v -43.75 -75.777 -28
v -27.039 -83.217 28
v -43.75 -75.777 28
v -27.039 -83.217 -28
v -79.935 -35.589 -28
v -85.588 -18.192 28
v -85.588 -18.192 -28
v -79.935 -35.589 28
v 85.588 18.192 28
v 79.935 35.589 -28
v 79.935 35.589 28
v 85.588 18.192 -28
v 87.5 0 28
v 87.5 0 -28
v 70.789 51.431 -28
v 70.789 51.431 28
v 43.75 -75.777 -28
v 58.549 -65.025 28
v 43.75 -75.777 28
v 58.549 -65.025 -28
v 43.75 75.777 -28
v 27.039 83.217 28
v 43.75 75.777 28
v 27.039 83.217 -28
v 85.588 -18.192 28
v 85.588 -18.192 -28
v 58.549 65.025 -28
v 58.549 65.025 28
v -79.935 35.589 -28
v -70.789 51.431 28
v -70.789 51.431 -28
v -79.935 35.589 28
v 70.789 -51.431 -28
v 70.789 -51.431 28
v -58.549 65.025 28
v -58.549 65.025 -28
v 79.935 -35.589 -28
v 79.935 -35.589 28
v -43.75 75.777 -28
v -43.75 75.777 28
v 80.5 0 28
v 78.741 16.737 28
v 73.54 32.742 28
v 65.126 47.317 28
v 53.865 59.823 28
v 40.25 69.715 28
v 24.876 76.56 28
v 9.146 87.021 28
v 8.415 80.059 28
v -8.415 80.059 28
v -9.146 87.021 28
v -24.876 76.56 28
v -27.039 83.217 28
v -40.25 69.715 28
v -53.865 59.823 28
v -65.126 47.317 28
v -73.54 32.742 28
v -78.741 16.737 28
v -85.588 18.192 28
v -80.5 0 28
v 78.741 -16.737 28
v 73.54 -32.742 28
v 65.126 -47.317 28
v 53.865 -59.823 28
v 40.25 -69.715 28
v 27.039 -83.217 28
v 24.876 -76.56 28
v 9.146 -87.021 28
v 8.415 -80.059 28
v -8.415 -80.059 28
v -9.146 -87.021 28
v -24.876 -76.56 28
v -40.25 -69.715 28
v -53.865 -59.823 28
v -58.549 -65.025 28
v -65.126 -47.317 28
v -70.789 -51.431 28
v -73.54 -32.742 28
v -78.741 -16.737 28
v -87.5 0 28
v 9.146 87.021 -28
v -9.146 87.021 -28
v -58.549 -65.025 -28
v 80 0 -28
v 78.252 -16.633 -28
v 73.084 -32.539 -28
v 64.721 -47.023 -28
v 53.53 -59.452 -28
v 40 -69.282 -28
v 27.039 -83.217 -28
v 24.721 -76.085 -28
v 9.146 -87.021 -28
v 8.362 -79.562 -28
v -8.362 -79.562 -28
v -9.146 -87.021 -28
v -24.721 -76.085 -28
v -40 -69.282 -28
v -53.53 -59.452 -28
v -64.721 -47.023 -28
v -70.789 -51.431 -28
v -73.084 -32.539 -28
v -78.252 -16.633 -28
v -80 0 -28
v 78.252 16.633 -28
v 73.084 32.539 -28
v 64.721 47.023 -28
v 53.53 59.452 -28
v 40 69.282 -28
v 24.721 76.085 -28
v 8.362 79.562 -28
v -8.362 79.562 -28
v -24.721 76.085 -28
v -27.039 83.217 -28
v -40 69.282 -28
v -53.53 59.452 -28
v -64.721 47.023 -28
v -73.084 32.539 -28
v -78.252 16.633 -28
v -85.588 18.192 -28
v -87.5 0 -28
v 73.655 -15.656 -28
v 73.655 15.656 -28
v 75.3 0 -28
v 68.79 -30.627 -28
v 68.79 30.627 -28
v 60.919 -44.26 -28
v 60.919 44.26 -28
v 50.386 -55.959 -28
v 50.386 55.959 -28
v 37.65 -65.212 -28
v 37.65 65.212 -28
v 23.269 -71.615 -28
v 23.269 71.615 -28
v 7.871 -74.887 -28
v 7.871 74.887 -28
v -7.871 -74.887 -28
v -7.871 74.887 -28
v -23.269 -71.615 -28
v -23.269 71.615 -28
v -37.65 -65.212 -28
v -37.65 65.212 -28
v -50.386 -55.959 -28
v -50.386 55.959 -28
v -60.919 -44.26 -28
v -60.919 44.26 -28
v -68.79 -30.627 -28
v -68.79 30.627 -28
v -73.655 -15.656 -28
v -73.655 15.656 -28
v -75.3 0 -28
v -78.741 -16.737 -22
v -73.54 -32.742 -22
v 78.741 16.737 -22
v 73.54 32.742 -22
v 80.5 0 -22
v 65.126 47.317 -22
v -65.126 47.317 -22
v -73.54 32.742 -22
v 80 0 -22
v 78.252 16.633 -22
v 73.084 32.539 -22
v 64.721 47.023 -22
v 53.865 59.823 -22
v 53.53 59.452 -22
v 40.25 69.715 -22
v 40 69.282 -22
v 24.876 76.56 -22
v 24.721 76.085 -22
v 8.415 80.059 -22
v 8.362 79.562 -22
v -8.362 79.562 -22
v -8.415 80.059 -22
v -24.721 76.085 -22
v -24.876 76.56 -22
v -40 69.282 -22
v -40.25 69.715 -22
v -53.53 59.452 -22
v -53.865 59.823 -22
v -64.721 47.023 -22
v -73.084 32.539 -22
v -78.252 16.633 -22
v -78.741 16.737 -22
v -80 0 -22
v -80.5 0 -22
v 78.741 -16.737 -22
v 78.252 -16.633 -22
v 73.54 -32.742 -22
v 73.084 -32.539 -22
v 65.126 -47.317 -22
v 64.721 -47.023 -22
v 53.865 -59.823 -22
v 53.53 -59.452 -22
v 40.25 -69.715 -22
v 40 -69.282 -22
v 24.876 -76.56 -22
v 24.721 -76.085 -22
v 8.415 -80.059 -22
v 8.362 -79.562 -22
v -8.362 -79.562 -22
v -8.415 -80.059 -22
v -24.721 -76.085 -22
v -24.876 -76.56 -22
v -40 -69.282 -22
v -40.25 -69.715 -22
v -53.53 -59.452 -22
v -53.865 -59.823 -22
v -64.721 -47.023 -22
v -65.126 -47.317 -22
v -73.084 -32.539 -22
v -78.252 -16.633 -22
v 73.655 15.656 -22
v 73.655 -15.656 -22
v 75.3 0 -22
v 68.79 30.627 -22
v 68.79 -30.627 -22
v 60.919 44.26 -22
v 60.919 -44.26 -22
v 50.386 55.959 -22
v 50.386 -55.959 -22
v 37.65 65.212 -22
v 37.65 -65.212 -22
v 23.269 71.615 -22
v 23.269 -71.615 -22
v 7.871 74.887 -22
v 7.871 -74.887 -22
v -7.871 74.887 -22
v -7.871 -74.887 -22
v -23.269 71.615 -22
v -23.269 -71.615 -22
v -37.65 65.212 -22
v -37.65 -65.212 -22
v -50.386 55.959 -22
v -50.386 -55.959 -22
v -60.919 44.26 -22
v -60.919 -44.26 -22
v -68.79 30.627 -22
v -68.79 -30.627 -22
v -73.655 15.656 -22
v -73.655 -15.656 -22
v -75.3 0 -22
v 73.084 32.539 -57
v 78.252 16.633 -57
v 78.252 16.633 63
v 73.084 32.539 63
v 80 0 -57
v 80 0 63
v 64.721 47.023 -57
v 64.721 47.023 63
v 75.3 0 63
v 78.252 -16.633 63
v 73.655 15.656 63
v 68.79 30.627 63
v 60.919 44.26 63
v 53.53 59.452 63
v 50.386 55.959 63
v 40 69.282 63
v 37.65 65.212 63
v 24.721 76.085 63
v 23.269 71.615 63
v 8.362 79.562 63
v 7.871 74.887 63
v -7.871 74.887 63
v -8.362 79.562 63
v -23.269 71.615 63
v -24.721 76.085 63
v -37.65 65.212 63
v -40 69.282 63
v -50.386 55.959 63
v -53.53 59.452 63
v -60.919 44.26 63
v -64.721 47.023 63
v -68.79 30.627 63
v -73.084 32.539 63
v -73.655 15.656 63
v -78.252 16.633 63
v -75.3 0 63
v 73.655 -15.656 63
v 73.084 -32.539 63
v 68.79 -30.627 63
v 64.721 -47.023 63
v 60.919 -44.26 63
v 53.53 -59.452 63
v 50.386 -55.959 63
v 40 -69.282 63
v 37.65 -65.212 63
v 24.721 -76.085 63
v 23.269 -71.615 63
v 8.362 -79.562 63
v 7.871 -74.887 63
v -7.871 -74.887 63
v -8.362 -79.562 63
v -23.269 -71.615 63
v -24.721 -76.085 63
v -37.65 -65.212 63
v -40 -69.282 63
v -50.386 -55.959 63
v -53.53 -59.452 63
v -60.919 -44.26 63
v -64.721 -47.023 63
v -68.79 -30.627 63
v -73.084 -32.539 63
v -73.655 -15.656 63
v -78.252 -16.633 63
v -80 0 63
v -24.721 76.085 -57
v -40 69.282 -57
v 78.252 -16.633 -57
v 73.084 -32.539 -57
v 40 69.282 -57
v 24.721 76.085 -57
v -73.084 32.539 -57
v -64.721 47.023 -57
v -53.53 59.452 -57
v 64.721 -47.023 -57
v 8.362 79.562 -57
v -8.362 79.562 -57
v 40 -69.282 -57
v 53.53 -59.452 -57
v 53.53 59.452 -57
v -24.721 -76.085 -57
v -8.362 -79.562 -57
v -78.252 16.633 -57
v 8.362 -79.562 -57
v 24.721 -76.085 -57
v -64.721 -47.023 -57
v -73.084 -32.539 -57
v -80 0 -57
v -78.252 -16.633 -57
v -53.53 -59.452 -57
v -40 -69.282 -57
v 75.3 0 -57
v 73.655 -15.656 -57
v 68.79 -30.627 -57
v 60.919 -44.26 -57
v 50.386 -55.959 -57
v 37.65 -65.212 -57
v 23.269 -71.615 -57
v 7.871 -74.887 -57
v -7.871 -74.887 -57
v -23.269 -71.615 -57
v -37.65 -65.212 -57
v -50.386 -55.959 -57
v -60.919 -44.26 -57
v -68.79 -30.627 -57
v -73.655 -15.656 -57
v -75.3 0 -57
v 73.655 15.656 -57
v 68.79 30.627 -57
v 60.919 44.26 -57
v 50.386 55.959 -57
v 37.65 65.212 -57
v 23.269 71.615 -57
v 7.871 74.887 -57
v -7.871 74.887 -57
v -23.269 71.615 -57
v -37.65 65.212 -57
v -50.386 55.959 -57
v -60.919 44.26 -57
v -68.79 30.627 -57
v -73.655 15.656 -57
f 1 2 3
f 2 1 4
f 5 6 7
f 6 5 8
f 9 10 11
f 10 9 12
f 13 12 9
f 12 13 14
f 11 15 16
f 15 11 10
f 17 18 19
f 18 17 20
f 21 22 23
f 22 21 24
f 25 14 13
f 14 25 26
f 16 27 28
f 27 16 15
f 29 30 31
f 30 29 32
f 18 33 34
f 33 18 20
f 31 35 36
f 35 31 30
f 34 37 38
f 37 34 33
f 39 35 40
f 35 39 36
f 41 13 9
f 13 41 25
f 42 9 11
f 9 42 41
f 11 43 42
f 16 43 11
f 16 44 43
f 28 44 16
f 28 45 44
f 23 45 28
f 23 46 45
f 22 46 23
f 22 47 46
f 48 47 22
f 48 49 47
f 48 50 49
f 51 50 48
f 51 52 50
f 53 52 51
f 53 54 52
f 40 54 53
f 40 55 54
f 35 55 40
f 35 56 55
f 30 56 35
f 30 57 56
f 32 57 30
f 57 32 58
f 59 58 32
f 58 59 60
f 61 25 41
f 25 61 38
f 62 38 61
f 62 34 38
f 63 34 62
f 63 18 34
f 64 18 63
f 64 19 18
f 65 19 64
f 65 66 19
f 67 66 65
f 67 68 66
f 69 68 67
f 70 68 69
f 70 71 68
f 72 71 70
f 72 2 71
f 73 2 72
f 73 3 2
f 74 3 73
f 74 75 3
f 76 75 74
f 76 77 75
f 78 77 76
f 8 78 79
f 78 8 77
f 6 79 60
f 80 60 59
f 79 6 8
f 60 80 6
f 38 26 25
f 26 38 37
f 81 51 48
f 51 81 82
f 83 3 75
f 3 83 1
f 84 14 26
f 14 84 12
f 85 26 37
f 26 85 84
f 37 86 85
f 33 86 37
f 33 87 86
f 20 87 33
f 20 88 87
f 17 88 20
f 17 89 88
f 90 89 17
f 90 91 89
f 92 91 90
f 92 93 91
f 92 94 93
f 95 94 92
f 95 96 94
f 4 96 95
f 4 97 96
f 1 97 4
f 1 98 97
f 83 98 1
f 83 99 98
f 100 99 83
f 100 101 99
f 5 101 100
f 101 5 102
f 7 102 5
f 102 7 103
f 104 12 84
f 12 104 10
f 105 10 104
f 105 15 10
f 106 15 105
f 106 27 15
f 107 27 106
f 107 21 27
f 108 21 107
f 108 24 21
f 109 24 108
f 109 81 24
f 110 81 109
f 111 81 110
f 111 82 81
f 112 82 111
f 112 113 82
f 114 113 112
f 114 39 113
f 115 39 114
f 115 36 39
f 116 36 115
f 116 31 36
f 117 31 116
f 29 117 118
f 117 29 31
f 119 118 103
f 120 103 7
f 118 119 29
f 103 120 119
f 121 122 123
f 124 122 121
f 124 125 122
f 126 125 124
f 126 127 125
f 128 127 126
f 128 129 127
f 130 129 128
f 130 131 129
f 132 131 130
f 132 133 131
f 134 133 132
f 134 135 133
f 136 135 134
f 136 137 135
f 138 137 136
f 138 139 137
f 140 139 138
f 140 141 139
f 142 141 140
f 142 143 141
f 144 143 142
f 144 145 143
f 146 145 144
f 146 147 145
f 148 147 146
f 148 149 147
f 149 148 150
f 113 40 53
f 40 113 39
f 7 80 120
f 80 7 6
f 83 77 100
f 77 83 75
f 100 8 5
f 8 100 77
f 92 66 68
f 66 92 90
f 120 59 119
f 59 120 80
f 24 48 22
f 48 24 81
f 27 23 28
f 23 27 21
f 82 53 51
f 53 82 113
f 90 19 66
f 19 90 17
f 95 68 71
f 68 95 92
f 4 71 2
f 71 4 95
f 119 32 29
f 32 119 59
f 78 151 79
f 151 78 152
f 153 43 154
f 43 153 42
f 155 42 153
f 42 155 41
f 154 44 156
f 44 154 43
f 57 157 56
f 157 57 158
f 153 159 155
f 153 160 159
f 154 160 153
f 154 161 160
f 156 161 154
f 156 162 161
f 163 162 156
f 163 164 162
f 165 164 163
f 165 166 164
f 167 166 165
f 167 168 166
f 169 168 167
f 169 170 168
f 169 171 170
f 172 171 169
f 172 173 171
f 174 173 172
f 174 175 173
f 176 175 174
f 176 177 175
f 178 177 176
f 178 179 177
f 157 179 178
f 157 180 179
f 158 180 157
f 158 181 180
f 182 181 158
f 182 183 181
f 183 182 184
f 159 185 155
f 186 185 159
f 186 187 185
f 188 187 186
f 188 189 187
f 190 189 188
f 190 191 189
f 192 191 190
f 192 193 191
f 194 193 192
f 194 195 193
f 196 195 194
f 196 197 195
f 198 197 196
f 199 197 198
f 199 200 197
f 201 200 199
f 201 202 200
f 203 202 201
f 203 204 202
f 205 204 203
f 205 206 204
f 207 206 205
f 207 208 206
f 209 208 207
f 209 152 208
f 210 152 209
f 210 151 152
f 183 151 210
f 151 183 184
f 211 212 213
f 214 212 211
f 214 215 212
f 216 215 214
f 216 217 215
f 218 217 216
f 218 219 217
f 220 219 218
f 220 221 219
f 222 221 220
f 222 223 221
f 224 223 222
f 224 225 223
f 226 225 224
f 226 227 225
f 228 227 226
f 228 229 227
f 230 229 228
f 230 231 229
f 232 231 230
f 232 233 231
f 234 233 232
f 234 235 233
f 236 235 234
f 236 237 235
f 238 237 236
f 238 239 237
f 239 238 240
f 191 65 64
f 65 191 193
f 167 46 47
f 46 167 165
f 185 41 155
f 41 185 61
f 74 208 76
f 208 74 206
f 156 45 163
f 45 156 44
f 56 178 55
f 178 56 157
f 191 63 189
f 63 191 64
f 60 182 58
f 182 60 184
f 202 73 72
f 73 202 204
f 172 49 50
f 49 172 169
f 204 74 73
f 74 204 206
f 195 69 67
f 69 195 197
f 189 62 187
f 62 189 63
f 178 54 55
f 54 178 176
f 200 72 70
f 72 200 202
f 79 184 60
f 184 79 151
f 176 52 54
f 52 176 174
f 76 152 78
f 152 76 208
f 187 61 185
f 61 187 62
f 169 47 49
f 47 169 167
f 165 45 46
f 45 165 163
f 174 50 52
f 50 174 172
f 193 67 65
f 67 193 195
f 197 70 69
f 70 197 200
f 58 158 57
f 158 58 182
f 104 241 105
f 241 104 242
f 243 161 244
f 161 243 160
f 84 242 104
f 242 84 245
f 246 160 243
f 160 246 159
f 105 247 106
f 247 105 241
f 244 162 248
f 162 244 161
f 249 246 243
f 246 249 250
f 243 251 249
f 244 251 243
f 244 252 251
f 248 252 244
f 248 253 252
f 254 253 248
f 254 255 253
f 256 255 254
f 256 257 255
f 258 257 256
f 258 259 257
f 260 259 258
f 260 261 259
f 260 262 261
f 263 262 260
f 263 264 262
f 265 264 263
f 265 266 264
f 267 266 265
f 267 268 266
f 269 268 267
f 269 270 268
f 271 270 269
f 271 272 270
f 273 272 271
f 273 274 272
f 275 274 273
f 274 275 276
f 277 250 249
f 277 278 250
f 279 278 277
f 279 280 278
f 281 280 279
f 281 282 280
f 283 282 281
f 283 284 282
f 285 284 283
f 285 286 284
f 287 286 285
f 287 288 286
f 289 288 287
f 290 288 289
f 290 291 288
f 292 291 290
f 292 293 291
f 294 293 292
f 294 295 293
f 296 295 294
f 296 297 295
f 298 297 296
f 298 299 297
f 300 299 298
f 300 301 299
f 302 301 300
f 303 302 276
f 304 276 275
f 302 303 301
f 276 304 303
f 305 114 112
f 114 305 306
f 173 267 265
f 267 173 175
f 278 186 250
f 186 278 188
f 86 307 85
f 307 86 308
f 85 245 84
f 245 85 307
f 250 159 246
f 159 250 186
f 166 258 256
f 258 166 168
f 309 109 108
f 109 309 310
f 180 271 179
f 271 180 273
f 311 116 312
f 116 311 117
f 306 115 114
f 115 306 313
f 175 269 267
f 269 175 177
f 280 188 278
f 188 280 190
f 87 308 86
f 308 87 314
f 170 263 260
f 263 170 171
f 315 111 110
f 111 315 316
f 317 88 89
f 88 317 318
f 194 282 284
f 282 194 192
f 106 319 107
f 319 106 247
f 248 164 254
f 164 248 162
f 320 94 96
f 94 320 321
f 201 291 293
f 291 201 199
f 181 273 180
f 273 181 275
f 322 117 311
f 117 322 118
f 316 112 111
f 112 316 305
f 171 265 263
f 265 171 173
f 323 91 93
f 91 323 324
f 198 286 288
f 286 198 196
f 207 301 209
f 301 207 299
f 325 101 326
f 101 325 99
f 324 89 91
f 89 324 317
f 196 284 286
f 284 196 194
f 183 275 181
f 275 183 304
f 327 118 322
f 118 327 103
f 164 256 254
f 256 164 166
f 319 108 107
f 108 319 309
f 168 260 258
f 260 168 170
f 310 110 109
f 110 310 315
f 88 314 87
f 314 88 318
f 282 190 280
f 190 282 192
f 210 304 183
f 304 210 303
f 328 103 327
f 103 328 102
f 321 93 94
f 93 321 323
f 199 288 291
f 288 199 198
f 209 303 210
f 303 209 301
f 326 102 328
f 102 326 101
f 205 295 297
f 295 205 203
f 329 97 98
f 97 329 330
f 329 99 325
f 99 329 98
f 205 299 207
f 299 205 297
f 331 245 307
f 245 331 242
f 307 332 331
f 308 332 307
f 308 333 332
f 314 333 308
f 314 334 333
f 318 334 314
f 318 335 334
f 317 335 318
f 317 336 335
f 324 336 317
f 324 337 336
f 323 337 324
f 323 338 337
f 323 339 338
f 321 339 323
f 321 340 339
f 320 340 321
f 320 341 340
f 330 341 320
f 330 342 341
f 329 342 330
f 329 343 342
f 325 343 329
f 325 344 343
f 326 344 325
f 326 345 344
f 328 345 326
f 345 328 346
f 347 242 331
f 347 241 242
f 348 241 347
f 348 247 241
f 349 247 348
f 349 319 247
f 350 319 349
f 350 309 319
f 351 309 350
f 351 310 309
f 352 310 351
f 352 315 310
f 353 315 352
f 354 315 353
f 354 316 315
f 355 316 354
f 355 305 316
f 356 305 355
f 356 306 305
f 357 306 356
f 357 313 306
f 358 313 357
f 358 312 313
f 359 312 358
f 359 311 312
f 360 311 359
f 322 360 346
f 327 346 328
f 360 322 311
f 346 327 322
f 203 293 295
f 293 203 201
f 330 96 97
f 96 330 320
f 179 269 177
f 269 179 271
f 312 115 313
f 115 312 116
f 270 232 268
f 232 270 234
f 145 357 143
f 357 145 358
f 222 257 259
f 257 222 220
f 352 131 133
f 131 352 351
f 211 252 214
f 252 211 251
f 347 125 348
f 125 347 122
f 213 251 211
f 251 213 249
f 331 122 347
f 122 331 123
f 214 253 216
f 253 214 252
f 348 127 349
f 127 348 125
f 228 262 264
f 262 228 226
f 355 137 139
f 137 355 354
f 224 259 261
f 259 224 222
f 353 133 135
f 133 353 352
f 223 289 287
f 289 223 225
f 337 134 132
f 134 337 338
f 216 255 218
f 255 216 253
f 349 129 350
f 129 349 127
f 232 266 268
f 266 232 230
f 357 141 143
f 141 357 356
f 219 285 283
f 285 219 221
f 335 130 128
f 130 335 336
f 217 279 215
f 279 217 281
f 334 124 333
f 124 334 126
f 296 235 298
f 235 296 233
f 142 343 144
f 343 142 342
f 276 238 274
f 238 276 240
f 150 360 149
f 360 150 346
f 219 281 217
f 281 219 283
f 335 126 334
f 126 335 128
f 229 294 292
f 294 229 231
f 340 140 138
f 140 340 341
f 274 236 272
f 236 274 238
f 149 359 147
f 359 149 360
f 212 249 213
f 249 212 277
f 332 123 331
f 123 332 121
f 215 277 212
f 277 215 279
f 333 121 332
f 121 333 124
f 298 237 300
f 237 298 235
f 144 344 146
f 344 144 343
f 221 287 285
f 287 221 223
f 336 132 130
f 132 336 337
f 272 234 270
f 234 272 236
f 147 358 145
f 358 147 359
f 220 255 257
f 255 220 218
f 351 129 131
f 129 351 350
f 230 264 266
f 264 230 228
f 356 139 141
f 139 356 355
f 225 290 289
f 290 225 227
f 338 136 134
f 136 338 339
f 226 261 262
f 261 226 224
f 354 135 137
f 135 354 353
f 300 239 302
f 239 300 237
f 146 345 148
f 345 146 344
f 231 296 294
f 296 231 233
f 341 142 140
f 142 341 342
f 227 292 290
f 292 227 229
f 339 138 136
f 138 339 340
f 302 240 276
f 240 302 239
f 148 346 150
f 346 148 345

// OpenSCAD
// Parameters
nominal_diameter_mm = 160; //[80:320:1]
pipe_outer_diameter_mm = 160; //[80:320:1]
cap_wall_thickness_mm = 4; //[2:8:0.5]
socket_insertion_depth_mm = 50; //[25:100:1]
end_thickness_mm = 6; //[3:12:0.5]
clearance_mm = 0.5; //[0.2:1.5:0.1]
outer_rim_thickness_mm = 3; //[1.5:6:0.5]
outer_rim_height_mm = 10; //[5:25:1]
fillet_radius_mm = 1; //[0:3:0.5]
pipe_wall_thickness_mm = 4.7; //[2.5:9.5:0.1]
ht_pipe_length_mm = 120; //[60:240:1]
overlap_mm = 1; //[0.5:2:0.1]

// HT Pipe - complete geometry
module ht_pipe() {
  color([0.85, 0.85, 0.8]) {
    difference() {
      // Outer pipe
      cylinder(r=pipe_outer_diameter_mm/2, h=ht_pipe_length_mm, center=true);
      // Inner cavity
      translate([0, 0, -overlap_mm/2])
        cylinder(r=pipe_outer_diameter_mm/2 - pipe_wall_thickness_mm, h=ht_pipe_length_mm + overlap_mm, center=true);
    }
  }
}

// Cap Body - complete geometry
module cap_body() {
  color([0.2, 0.2, 0.2]) {
    difference() {
      union() {
        // Outer cap body
        cylinder(r=pipe_outer_diameter_mm/2 + clearance_mm + cap_wall_thickness_mm + outer_rim_thickness_mm, h=socket_insertion_depth_mm + end_thickness_mm, center=true);
        // Outer grip rim
        translate([0, 0, ((socket_insertion_depth_mm + end_thickness_mm)/2) - outer_rim_height_mm/2])
          cylinder(r=pipe_outer_diameter_mm/2 + clearance_mm + cap_wall_thickness_mm + outer_rim_thickness_mm, h=outer_rim_height_mm, center=true);
      }
      // Inner socket cavity
      translate([0, 0, ((socket_insertion_depth_mm + end_thickness_mm)/2) - socket_insertion_depth_mm/2 + overlap_mm/2])
        cylinder(r=pipe_outer_diameter_mm/2 + clearance_mm, h=socket_insertion_depth_mm + overlap_mm, center=true);
    }
  }
}

// Pipe Stop Shoulder
module pipe_stop_shoulder() {
  color([0.2, 0.2, 0.2]) {
    translate([0, 0, -((socket_insertion_depth_mm + end_thickness_mm)/2) + end_thickness_mm/2])
      cylinder(r=pipe_outer_diameter_mm/2 + clearance_mm, h=end_thickness_mm, center=true);
  }
}

// Assembly
module assembly() {
  cap_body();
  pipe_stop_shoulder();
  translate([0, 0, ((socket_insertion_depth_mm + end_thickness_mm)/2) - socket_insertion_depth_mm/2])
    ht_pipe();
}

assembly();
